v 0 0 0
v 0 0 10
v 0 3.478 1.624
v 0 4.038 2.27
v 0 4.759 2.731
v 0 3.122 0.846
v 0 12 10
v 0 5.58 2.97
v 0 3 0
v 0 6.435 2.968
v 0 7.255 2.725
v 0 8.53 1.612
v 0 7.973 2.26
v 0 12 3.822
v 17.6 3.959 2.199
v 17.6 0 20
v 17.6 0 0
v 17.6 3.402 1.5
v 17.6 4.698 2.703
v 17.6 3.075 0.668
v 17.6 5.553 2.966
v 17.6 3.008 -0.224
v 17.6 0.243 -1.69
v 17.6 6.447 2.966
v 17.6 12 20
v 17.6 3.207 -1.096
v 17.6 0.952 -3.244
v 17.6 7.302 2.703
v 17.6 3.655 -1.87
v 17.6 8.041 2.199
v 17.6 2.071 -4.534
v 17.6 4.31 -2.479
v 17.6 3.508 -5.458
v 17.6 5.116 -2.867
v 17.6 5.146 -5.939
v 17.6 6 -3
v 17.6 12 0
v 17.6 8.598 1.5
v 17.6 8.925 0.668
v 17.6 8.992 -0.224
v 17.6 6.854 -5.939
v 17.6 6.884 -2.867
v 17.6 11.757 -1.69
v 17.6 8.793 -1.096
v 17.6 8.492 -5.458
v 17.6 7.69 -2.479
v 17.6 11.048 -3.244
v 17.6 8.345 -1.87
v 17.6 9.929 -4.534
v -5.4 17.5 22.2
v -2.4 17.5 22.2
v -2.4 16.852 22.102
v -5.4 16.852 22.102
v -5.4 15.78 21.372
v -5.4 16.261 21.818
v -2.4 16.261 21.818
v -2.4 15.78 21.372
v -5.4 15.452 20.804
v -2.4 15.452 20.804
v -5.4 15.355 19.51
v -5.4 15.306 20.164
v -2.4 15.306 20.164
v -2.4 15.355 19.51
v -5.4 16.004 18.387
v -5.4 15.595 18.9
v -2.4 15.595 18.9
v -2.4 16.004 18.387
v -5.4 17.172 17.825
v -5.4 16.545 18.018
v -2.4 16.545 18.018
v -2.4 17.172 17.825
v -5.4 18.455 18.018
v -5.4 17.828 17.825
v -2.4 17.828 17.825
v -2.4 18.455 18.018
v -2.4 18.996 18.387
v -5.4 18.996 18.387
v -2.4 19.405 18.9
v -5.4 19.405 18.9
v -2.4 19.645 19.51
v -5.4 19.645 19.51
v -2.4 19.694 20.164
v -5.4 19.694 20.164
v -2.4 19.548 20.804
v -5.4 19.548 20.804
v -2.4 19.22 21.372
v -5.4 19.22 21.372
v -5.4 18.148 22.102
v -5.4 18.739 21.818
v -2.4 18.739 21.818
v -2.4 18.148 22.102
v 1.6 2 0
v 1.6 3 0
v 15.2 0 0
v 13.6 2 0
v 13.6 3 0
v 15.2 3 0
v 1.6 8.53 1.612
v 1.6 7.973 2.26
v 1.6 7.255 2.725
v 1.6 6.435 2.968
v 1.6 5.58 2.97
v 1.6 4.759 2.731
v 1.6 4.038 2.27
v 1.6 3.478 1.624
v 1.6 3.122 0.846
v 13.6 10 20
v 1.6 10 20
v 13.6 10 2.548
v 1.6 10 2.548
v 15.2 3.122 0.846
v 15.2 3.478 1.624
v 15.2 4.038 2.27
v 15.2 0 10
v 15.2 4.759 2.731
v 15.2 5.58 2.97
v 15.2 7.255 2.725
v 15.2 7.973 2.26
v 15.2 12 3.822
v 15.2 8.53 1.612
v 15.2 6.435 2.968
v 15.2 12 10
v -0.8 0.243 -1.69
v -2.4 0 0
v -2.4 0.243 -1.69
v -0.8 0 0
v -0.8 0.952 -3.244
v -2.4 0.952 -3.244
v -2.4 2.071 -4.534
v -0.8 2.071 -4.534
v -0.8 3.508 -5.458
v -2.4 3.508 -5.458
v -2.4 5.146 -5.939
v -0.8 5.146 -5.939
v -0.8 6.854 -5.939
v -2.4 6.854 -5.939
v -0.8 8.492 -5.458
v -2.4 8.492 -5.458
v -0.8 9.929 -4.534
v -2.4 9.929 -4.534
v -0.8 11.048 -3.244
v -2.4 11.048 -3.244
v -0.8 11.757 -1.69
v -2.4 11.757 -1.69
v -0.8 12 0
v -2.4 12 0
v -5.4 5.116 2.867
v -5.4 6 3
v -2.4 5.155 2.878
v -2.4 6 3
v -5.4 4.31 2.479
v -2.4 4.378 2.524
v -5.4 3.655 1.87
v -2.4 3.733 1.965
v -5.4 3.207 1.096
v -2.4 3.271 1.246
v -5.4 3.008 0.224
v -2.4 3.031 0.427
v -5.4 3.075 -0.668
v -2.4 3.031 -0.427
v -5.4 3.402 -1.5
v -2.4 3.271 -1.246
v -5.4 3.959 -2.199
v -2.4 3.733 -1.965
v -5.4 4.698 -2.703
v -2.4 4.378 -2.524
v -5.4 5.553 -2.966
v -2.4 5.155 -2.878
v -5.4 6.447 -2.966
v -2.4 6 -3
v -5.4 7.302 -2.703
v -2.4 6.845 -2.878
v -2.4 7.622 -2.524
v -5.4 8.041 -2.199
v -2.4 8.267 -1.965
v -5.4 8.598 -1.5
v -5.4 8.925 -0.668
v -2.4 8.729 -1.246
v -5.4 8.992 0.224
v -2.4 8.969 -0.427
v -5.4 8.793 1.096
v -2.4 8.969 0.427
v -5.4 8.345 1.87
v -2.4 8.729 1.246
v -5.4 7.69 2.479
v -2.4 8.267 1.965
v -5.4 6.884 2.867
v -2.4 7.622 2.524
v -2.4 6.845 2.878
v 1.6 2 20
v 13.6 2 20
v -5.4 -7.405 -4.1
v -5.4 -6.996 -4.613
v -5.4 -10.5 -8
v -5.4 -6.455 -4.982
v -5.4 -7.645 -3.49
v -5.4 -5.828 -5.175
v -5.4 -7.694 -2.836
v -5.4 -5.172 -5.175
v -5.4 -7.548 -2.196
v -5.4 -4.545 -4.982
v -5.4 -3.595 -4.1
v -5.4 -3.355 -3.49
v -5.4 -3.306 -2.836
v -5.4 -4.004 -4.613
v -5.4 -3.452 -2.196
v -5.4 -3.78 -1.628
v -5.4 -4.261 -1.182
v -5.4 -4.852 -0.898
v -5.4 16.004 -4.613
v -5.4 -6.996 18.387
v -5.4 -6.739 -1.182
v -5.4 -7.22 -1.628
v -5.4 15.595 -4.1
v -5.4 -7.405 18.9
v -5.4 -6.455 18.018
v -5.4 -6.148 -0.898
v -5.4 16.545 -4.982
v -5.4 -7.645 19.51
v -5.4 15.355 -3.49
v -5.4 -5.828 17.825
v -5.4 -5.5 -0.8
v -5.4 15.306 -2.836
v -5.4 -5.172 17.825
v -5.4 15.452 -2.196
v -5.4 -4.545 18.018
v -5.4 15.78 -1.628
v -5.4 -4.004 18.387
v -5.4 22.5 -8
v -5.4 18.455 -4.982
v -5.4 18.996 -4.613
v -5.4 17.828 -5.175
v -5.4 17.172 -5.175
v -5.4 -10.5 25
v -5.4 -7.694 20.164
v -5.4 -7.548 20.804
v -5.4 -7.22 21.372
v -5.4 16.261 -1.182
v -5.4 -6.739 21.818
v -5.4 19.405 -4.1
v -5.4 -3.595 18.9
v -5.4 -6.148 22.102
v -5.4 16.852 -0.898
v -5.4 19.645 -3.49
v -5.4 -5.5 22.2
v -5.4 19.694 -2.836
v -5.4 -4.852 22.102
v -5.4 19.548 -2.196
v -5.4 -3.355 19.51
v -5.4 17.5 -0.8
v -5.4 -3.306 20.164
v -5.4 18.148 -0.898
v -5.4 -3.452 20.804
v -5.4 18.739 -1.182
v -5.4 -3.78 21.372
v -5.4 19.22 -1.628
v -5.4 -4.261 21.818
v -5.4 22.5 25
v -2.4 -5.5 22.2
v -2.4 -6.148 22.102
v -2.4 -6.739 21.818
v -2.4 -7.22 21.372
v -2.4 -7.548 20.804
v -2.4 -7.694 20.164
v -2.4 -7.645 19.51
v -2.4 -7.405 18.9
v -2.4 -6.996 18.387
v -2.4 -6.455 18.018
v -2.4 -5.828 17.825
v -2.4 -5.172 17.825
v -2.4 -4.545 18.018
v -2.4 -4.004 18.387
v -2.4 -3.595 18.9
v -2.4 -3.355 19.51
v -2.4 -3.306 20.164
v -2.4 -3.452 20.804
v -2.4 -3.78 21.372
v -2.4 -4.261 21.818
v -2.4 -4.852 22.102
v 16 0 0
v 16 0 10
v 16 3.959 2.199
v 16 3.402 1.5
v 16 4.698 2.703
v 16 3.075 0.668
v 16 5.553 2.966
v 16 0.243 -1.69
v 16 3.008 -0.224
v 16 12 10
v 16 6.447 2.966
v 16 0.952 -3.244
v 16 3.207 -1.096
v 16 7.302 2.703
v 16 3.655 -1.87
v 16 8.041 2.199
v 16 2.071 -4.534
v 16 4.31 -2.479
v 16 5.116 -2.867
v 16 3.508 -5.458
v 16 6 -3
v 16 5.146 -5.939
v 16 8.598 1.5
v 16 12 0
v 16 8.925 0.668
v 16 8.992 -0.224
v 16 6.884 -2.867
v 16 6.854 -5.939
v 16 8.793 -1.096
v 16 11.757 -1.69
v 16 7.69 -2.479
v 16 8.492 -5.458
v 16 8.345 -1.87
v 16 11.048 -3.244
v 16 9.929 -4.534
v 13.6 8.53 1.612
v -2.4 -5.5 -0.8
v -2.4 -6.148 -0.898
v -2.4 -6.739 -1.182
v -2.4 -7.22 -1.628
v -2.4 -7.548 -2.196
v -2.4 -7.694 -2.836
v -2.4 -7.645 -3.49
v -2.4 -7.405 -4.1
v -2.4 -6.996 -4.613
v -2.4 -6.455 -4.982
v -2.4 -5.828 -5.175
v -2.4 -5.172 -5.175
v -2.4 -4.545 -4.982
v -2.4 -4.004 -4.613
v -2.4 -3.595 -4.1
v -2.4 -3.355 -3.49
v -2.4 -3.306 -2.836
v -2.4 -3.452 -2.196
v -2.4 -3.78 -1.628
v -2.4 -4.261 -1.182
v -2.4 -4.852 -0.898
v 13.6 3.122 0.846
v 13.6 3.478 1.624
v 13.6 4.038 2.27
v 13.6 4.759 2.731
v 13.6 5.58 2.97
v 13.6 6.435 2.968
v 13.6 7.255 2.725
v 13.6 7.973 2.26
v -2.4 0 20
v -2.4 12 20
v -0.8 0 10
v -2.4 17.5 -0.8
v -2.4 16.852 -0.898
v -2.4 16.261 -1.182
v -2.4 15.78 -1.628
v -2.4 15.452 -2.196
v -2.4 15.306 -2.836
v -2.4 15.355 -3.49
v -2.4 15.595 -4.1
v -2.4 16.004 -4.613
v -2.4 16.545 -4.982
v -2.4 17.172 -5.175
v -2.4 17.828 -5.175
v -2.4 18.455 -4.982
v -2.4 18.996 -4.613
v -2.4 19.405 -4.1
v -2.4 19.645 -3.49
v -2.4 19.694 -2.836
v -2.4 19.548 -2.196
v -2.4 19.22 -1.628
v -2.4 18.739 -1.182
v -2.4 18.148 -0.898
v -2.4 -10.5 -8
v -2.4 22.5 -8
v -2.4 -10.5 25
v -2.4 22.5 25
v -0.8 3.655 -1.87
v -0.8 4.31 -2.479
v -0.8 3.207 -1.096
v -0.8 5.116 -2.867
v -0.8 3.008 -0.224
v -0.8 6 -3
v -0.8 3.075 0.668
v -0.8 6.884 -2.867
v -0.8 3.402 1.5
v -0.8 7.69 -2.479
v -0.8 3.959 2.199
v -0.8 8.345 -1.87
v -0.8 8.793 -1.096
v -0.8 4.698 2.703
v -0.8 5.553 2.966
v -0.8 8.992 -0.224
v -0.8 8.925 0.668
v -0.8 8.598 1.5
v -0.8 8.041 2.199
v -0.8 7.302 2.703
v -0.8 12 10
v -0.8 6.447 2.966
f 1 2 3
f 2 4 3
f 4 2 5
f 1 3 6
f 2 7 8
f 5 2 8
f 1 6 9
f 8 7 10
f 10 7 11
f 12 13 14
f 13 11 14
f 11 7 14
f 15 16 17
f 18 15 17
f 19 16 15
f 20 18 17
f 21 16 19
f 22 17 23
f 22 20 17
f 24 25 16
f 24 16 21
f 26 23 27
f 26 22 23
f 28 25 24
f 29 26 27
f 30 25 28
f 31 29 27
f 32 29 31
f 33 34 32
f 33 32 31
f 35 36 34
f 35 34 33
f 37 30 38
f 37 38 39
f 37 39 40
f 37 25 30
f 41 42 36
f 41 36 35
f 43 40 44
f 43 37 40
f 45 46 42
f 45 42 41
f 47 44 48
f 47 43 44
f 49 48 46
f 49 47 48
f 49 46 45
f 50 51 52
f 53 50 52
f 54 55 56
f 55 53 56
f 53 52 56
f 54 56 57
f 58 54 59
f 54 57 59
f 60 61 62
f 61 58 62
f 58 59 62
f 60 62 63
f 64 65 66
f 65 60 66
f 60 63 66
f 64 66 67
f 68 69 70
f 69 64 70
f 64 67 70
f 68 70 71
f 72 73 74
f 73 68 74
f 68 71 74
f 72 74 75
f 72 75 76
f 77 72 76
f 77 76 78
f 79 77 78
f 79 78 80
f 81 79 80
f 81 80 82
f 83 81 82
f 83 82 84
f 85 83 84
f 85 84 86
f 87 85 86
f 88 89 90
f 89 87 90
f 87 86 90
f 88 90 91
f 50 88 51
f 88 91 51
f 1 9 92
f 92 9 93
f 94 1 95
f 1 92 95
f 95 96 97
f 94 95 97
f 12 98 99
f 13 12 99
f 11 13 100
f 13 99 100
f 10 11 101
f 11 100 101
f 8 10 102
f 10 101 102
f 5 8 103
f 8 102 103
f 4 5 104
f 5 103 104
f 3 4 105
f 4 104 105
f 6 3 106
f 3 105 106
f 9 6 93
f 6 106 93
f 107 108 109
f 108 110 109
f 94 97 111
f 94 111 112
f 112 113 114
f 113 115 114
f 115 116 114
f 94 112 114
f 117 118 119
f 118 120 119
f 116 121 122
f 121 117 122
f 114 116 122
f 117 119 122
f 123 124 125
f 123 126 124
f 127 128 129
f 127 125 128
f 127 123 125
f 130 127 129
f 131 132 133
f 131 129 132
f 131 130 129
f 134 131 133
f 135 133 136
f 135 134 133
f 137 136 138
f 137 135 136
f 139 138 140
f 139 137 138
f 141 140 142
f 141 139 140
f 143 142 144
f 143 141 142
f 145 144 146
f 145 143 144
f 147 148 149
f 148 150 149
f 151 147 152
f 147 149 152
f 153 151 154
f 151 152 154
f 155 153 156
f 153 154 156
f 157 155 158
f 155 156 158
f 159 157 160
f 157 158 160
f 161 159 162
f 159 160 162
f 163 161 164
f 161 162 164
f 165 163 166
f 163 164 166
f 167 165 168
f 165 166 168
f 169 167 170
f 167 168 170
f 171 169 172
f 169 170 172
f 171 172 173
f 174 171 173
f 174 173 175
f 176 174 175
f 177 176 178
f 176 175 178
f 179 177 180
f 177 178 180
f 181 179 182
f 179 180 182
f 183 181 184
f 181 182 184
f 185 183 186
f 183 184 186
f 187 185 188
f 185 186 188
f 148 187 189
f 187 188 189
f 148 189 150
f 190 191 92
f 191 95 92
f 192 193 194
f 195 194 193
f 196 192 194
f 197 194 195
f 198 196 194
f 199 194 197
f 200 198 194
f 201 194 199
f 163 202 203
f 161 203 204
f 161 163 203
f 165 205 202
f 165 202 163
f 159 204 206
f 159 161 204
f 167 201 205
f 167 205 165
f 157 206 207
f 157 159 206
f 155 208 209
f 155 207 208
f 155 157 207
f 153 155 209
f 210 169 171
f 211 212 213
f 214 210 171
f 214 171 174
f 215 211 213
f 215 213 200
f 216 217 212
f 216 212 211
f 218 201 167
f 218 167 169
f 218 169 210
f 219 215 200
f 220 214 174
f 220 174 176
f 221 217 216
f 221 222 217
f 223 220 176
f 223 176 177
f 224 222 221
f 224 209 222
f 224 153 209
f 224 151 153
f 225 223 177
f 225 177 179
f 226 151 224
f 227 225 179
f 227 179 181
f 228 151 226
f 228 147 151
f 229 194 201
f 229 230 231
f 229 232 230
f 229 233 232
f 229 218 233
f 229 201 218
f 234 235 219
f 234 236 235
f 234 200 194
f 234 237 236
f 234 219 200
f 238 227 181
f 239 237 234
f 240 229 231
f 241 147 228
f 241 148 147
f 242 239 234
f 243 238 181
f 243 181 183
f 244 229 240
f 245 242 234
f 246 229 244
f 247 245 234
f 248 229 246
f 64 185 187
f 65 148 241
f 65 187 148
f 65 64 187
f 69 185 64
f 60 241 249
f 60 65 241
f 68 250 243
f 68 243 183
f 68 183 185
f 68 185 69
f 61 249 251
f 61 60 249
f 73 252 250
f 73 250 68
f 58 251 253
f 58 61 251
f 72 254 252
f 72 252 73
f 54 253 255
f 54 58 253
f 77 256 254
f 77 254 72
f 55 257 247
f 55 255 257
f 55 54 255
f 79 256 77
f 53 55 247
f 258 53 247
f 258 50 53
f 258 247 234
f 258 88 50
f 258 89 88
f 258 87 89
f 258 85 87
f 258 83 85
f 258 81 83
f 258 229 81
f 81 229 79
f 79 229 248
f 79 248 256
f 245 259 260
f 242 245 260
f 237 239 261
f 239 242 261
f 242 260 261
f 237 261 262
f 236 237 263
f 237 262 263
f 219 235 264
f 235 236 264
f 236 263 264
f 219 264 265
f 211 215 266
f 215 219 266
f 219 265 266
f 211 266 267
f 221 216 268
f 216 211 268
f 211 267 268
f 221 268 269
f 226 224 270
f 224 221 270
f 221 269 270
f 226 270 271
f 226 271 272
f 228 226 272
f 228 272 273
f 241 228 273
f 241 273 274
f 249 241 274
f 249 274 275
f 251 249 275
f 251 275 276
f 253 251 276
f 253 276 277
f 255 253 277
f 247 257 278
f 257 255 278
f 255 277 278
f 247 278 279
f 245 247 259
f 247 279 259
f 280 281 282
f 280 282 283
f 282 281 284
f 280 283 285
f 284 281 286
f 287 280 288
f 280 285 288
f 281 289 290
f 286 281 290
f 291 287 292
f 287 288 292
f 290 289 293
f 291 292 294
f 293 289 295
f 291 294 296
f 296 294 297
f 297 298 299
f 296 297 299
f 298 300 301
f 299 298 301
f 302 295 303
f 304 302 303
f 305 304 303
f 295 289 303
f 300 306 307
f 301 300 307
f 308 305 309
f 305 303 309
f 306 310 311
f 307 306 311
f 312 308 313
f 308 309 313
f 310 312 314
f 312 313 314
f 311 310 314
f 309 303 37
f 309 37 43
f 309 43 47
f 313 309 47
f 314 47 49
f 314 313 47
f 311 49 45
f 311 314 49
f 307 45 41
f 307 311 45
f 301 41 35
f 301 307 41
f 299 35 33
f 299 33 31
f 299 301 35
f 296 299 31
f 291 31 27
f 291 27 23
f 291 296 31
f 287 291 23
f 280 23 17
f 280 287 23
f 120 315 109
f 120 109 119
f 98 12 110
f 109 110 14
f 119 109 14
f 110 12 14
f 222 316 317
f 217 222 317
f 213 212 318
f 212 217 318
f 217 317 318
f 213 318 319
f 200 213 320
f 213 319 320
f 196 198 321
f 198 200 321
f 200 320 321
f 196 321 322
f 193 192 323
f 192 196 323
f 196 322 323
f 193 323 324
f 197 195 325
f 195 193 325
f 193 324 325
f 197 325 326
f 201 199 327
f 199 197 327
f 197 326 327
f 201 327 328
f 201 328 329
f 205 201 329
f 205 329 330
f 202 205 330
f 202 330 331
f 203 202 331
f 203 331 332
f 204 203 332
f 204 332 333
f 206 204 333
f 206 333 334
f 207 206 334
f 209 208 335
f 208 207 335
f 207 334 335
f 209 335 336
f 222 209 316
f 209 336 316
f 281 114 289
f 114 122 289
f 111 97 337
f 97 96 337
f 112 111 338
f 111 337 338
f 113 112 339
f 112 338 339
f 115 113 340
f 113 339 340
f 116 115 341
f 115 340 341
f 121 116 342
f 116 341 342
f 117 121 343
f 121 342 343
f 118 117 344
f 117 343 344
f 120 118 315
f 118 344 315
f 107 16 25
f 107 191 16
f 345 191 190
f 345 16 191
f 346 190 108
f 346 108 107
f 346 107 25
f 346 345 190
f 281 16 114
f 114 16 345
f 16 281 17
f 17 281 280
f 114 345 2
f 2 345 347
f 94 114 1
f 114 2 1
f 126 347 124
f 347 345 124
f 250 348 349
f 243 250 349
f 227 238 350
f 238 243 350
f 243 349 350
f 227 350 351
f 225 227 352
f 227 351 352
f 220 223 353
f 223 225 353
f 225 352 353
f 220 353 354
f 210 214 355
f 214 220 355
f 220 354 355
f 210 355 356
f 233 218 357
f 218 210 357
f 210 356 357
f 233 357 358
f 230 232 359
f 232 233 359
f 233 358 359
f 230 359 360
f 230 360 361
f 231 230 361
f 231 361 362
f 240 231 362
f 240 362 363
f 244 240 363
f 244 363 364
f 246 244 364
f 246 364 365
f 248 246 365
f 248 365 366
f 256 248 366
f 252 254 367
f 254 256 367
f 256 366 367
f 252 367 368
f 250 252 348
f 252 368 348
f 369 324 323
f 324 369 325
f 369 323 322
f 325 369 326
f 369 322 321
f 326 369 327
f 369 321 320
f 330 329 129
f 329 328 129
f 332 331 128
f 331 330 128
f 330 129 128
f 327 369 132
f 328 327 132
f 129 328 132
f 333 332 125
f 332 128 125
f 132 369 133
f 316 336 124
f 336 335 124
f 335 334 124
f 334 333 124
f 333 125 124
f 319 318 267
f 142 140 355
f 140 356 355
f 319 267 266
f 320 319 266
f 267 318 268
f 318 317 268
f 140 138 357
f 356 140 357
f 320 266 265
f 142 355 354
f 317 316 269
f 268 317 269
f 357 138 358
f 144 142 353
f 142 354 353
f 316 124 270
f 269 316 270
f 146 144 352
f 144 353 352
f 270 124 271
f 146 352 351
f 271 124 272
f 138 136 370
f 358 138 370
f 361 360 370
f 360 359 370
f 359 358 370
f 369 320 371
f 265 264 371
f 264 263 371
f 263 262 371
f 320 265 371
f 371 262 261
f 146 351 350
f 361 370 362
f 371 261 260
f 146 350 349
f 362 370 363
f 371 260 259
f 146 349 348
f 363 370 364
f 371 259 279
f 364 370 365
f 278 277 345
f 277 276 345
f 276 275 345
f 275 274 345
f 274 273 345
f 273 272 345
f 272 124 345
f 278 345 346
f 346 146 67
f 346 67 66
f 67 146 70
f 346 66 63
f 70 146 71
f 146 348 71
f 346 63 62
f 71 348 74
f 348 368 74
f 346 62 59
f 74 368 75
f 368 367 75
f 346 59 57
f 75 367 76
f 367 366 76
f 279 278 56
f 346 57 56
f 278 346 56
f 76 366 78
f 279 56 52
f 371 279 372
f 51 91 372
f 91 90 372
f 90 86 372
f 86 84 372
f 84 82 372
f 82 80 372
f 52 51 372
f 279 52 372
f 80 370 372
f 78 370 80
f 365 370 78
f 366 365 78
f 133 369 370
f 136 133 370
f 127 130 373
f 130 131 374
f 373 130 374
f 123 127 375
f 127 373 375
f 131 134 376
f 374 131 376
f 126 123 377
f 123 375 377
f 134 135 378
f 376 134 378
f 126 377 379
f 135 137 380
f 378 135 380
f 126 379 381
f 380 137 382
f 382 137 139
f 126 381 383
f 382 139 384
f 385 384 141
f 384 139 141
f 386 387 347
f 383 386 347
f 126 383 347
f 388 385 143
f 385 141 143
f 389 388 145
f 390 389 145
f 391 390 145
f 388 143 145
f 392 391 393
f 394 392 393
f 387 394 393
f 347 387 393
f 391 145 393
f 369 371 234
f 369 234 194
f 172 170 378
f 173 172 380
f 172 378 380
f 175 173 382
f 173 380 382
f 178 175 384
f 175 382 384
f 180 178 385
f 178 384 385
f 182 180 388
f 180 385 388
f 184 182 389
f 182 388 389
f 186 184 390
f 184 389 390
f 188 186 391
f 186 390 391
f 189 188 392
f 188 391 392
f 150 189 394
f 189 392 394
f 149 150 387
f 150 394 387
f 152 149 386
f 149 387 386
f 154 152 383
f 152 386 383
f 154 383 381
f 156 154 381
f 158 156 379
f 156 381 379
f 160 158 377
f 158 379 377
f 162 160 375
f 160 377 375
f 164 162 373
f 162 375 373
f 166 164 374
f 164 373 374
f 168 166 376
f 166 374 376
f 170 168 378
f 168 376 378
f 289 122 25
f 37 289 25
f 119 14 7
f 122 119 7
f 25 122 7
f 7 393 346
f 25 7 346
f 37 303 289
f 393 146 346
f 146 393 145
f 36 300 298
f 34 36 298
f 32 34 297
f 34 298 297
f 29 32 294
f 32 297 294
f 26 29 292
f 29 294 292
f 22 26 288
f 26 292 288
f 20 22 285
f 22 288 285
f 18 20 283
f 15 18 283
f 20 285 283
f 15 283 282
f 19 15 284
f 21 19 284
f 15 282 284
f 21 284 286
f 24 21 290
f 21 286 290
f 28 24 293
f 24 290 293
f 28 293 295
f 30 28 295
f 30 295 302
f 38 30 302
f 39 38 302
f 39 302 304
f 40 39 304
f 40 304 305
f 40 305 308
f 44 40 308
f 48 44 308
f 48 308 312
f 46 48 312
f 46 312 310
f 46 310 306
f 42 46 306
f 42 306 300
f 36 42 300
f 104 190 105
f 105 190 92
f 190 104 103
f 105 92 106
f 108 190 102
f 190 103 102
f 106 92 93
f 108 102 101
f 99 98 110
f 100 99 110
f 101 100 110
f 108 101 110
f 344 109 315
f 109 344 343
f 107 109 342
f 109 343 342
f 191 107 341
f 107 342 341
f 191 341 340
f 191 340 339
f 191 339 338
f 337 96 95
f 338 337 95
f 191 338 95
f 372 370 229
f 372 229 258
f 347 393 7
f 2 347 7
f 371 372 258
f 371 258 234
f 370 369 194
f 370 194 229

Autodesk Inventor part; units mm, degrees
ref_plane "YZ Plane" through (0, 0, 0) normal (1, 0, 0) x (0, 1, 0)
ref_plane "XZ Plane" through (0, 0, 0) normal (0, 1, 0) x (-1, 0, 0)
sketch "Sketch1" plane through (0, 0, 0) normal (0, 0, 1) x (1, 0, 0)
  line L0 (0, 0) -> (15.2, 0)
  line L1 (15.2, 0) -> (15.2, 12)
  line L2 (15.2, 12) -> (0, 12)
  line L3 (0, 12) -> (0, 0)
  line L4 (1.6, 10) -> (13.6, 10)
  line L5 (13.6, 10) -> (13.6, 2)
  line L6 (13.6, 2) -> (1.6, 2)
  line L7 (1.6, 2) -> (1.6, 10)
  dimension "d0" = 15.2
  dimension "d1" = 12
  dimension "d2" = 1.6
  dimension "d3" = 2
  dimension "d4" = 2
  dimension "d5" = 1.6
extrude "Extrusion1" add sketch "Sketch1" along normal blind 20
sketch "Sketch2" plane through (0, 0, 0) normal (1, 0, 0) x (0, 1, 0)
  line L0 (0, 0) -> (12, 0) construction
  line L1 (6, 13.0663) -> (6, -2.0093) construction
  line L2 (0, 0) -> (0, 20) construction
  line L3 (12, 0) -> (12, 20) construction
  line L4 (6, 0) -> (12, 3.8224)
  line L5 (12, 3.8224) -> (12, 0)
  line L6 (12, 0) -> (6, 0)
  dimension "d8" = 12
  dimension "d9" = 6
  dimension "d10" = 32.5
extrude "Extrusion2" cut sketch "Sketch2" along normal through all
sketch "Sketch9" plane through (0, 0, 20) normal (-1, 0, 0) x (0, 0, 1)
  line L0 (-20, 0) -> (0, 0) construction
  line L1 (0, 12) -> (0, 0) construction
  line L2 (-16.1776, 12) -> (0, 12) construction
  line L3 (-20, 0) -> (-20, 14.5103) construction
  line L4 (-20, 0) -> (0, 0)
  line L5 (0, 12) -> (0, 0)
  line L6 (0, 12) -> (-20, 12)
  arc A0 (-20, 12) -> (-20, 0) centre (-20, 6) ccw
extrude "Extrusion8" add sketch "Sketch9" along normal blind 2.4
sketch "Sketch4" plane through (1.6, 2, 20) normal (1, 0, 0) x (0, 0, -1)
  circle A0 centre (20, 4) radius 3
  point P0 (20, -2)
  dimension "d14" = 6
extrude "Extrusion3" cut sketch "Sketch4" along normal through all both and the other way through all
sketch "Sketch11" plane through (15.2, 12, 20) normal (0, 1, 0) x (1, 0, 0)
  line L0 (0, 0) -> (-17.6, 0) construction
  line L1 (-15.2, 26) -> (-15.2, 20) construction
  line L2 (-15.2, 26) -> (-16, 26)
  line L3 (-16, 26) -> (-16, 10)
  line L4 (-16, 10) -> (-15.2, 10)
  line L5 (-15.2, 10) -> (-15.2, 26)
  line L6 (-15.2, 20) -> (-13.6, 20) construction
  dimension "d38" = 10
  dimension "d39" = 0.8
extrude "Extrusion9" cut sketch "Sketch11" against normal through all
ref_plane "Work Plane4" through (7.6, 2, 20) normal (-1, 0, 0) x (0, 0, 1)
mirror "Mirror3" about plane through (7.6, 2, 20) normal (-1, 0, 0) of "Extrusion8", "Extrusion3", "Extrusion9"
sketch "Sketch17" plane through (-2.4, 0, 20) normal (-1, 0, 0) x (0, 0, 1)
  circle A0 centre (-20, 6) radius 3 projected
  line L0 (0, 0) -> (0, 12) construction
  arc A1 (-20, 12) -> (-20, 0) centre (-20, 6) ccw construction
  line L1 (5, -10.5) -> (-28, -10.5)
  line L2 (-28, -10.5) -> (-28, 22.5)
  line L3 (-28, 22.5) -> (5, 22.5)
  line L4 (5, 22.5) -> (5, -10.5)
  line L5 (-20, 6) -> (17.487, 6) construction
  circle A2 centre (-23, 17.5) radius 2.2
  circle A3 centre (0, 17.5) radius 2.2
  circle A4 centre (-23, -5.5) radius 2.2
  circle A5 centre (0, -5.5) radius 2.2
  dimension "d82" = 33
  dimension "d83" = 5
  dimension "d84" = 16.5
  dimension "d85" = 4.4
  dimension "d86" = 5
  dimension "d87" = 5
  dimension "d90" = 23
  dimension "d93" = 23
extrude "Extrusion15" add sketch "Sketch17" along normal blind 3
equation "\"d9\" = 0.5 * d8"
equation "\"d84\" = 0.5 * d82"
properties part number "chain_end_extruder-back"
